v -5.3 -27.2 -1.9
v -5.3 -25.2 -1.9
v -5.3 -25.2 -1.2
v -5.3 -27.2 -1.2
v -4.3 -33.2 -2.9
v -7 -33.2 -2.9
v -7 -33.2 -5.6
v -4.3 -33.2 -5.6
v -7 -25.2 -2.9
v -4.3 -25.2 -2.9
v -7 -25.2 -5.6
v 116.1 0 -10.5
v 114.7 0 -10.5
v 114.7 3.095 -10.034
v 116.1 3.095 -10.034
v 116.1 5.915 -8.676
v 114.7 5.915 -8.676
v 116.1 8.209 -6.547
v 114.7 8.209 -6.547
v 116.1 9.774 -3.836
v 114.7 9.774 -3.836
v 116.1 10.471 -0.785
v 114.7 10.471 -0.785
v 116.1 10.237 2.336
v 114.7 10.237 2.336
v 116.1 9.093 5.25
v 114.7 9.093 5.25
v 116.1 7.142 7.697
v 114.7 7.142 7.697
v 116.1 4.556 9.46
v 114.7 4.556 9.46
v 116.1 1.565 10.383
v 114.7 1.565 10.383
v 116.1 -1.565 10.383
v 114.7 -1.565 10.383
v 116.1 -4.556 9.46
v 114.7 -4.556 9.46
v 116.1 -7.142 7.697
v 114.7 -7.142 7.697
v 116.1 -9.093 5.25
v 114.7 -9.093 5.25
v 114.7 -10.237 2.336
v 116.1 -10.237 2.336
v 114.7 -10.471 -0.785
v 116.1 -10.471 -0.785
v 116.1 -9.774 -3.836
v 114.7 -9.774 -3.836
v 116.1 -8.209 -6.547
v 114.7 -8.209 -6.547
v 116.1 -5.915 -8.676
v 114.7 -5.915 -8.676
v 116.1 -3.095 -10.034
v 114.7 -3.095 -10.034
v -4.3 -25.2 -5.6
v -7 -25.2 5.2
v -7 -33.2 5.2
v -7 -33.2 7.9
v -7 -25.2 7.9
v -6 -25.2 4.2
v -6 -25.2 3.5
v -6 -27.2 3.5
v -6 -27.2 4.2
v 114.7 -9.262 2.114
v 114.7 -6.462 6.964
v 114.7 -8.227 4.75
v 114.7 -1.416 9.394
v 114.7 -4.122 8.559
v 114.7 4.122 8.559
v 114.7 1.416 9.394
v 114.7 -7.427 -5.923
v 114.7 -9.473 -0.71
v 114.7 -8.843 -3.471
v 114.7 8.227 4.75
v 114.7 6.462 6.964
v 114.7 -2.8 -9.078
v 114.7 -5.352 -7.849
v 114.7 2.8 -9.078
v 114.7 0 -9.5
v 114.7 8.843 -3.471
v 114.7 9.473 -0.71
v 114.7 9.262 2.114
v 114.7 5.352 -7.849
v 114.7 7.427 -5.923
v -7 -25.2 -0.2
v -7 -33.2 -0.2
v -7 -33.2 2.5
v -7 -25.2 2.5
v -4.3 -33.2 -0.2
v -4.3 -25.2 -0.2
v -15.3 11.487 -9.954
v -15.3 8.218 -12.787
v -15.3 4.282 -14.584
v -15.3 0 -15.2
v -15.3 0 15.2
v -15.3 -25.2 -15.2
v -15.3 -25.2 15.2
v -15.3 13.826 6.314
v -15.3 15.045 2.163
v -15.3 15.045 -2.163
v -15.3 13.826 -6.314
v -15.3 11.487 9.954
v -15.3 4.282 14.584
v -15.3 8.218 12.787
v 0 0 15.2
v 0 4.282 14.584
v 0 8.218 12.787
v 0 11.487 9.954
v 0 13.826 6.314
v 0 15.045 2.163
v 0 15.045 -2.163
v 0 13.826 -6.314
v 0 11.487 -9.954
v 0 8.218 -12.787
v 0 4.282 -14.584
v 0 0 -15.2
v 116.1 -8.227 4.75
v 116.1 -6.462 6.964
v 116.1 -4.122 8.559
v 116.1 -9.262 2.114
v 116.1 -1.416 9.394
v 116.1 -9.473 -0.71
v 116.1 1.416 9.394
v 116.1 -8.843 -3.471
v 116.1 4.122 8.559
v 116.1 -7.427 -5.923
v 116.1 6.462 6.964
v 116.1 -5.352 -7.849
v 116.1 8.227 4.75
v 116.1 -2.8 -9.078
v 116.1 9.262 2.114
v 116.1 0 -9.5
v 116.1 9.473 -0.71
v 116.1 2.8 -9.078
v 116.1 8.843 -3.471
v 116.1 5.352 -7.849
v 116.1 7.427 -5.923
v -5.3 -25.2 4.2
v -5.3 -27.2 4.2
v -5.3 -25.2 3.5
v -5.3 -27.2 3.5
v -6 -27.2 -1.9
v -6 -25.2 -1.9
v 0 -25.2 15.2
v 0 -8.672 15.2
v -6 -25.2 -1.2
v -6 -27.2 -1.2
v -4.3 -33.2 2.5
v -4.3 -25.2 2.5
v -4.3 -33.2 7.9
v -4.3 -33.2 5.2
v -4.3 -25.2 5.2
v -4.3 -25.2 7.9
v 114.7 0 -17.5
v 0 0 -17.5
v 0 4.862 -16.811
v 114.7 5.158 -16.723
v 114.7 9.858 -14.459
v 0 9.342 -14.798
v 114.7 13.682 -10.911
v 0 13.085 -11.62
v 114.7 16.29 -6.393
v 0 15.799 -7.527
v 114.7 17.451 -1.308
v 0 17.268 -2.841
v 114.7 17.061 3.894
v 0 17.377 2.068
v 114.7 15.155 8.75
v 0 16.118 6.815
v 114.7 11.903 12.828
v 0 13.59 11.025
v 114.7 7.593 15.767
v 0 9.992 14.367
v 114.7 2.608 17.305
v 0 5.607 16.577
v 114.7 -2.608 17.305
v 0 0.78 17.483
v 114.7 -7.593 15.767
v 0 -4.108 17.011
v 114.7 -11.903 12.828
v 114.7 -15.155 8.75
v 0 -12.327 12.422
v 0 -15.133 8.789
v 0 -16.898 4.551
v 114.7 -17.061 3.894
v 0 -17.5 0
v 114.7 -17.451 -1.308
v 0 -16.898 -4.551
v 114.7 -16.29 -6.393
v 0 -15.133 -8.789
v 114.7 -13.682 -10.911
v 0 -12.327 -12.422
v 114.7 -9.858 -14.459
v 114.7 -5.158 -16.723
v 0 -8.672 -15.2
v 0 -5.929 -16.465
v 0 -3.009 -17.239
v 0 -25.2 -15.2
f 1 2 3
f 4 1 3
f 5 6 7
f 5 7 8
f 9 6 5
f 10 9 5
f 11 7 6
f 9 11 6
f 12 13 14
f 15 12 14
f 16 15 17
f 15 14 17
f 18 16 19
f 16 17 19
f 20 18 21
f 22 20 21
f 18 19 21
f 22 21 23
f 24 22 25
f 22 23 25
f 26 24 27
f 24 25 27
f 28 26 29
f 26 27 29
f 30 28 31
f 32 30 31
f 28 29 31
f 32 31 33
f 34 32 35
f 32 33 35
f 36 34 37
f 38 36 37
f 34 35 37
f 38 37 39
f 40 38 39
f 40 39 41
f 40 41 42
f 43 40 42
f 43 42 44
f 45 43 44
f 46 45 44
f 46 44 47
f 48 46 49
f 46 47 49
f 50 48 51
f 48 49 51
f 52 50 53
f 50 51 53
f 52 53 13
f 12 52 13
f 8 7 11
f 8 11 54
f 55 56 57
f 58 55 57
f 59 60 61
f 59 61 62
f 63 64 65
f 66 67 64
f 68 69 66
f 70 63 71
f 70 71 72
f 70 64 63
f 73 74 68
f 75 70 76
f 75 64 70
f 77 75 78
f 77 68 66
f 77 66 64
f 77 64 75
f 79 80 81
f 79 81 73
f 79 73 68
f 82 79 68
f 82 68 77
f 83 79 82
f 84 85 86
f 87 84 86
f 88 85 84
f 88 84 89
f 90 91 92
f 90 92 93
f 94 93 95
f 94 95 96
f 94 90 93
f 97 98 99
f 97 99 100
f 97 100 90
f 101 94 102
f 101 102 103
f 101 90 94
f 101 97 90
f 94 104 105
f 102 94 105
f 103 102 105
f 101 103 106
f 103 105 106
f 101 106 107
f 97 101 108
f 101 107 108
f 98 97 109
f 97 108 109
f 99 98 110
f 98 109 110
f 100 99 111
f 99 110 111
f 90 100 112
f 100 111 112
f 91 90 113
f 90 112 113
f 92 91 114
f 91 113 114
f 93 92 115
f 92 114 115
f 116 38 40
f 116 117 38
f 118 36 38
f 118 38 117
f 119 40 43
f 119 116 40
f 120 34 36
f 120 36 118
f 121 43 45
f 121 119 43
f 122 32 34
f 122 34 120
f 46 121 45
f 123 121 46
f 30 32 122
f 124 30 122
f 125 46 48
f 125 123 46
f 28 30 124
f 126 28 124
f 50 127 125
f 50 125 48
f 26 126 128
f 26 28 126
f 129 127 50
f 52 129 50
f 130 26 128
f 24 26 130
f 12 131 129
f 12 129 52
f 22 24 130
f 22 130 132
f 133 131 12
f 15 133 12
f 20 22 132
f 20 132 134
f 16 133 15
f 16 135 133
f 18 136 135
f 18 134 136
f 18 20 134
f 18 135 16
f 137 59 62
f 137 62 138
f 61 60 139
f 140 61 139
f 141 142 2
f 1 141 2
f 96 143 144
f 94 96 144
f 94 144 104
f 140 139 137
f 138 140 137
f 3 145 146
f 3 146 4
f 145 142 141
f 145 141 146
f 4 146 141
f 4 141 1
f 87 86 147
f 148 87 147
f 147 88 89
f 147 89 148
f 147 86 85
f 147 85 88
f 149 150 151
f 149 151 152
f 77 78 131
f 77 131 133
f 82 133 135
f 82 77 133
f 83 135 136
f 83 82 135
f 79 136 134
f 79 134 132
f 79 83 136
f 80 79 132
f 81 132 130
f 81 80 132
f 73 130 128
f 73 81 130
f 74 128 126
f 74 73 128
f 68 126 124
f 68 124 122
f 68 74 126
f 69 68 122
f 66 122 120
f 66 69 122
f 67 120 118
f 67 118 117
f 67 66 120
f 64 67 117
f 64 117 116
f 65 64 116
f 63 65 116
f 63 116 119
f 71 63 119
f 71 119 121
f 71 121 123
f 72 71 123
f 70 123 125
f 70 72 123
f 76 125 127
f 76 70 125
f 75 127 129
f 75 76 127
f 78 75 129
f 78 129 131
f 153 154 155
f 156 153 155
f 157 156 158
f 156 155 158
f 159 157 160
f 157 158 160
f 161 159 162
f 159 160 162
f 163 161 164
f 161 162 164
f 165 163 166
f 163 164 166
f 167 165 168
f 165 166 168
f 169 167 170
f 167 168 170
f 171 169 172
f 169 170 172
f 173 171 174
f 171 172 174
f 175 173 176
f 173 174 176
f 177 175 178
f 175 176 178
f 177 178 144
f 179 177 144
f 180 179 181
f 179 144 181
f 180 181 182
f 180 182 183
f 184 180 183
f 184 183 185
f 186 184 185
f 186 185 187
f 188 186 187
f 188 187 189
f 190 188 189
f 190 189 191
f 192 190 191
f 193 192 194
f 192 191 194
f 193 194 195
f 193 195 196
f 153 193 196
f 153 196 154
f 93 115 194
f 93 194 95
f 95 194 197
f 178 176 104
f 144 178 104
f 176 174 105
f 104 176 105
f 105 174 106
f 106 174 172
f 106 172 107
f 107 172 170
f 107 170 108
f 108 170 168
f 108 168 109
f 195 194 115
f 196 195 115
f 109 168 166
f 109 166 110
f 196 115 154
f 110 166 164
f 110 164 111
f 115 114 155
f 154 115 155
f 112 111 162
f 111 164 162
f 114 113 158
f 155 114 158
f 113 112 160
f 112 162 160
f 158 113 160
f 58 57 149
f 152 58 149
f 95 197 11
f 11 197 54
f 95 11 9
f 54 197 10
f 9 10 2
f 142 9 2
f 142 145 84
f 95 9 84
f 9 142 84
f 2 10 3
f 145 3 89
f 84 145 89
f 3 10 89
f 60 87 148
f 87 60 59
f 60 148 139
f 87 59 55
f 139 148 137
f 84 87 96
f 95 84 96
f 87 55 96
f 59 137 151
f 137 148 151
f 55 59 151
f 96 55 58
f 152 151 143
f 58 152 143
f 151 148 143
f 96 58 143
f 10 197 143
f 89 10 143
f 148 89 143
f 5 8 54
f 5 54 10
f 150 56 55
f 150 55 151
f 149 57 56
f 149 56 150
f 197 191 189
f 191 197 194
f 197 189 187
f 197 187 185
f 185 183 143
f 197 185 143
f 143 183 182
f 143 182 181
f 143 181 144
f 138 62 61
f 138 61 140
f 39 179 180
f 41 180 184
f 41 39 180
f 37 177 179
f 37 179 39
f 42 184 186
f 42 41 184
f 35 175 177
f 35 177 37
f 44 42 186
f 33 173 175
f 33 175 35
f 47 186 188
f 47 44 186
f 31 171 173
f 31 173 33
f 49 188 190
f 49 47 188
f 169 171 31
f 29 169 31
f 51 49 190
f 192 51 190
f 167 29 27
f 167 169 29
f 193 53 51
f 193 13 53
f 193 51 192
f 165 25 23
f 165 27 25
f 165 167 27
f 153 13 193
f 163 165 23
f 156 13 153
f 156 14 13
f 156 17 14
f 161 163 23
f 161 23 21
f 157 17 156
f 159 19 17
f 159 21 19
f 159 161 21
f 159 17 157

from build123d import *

# Parameters (mm, degrees)
SKETCH_2_R      = 17.5
EXTRUDE_1_DEPTH = 114.7
SKETCH_3_R      = 10.5
SKETCH_3_R_2    = 9.5
EXTRUDE_2_DEPTH = 1.4
EXTRUDE_6_DEPTH = 15.3
SKETCH_8_W      = 2.7
SKETCH_8_H      = 2.7
EXTRUDE_7_DEPTH = 8
SKETCH_8_3_W    = 0.7
SKETCH_8_3_H    = 0.7
EXTRUDE_8_DEPTH = 2


with BuildPart() as part:
    # 草图2 → 凸台-拉伸1 (new body)
    with BuildSketch(Plane(origin=(0, 0, 0), x_dir=(0, 0, -1), z_dir=(1, 0, 0))):
        Circle(SKETCH_2_R)
    extrude(amount=EXTRUDE_1_DEPTH)

    # 草图3 → 凸台-拉伸2 (add)
    with BuildSketch(Plane(origin=(114.7, 0, 0), x_dir=(0, 0, -1), z_dir=(1, 0, 0))):
        Circle(SKETCH_3_R)
        Circle(SKETCH_3_R_2, mode=Mode.SUBTRACT)
    extrude(amount=EXTRUDE_2_DEPTH)

    # 草图6 → 凸台-拉伸6 (add)
    with BuildSketch(Plane.ZY):
        with BuildLine():
            Line((-15.2, 0), (-15.2, -25.2))
            Line((-15.2, -25.2), (15.2, -25.2))
            Line((15.2, -25.2), (15.2, 0))
            ThreePointArc((15.2, 0), (0, 15.2), (-15.2, 0))
        make_face()
    extrude(amount=EXTRUDE_6_DEPTH)

    # 草图8 → 凸台-拉伸7 (add)
    with BuildSketch(Plane.XZ.offset(25.2)):
        with Locations((-5.65, -4.25)):
            Rectangle(SKETCH_8_W, SKETCH_8_H)
        with Locations((-5.65, 1.15)):
            Rectangle(SKETCH_8_W, SKETCH_8_H)
        with Locations((-5.65, 6.55)):
            Rectangle(SKETCH_8_W, SKETCH_8_H)
    extrude(amount=EXTRUDE_7_DEPTH)

    # 草图8<3> → 凸台-拉伸8 (add)
    with BuildSketch(Plane.XZ.offset(25.2)):
        with Locations((-5.65, -1.55)):
            Rectangle(SKETCH_8_3_W, SKETCH_8_3_H)
        with Locations((-5.65, 3.85)):
            Rectangle(SKETCH_8_3_W, SKETCH_8_3_H)
    extrude(amount=EXTRUDE_8_DEPTH)


solid = part.part
